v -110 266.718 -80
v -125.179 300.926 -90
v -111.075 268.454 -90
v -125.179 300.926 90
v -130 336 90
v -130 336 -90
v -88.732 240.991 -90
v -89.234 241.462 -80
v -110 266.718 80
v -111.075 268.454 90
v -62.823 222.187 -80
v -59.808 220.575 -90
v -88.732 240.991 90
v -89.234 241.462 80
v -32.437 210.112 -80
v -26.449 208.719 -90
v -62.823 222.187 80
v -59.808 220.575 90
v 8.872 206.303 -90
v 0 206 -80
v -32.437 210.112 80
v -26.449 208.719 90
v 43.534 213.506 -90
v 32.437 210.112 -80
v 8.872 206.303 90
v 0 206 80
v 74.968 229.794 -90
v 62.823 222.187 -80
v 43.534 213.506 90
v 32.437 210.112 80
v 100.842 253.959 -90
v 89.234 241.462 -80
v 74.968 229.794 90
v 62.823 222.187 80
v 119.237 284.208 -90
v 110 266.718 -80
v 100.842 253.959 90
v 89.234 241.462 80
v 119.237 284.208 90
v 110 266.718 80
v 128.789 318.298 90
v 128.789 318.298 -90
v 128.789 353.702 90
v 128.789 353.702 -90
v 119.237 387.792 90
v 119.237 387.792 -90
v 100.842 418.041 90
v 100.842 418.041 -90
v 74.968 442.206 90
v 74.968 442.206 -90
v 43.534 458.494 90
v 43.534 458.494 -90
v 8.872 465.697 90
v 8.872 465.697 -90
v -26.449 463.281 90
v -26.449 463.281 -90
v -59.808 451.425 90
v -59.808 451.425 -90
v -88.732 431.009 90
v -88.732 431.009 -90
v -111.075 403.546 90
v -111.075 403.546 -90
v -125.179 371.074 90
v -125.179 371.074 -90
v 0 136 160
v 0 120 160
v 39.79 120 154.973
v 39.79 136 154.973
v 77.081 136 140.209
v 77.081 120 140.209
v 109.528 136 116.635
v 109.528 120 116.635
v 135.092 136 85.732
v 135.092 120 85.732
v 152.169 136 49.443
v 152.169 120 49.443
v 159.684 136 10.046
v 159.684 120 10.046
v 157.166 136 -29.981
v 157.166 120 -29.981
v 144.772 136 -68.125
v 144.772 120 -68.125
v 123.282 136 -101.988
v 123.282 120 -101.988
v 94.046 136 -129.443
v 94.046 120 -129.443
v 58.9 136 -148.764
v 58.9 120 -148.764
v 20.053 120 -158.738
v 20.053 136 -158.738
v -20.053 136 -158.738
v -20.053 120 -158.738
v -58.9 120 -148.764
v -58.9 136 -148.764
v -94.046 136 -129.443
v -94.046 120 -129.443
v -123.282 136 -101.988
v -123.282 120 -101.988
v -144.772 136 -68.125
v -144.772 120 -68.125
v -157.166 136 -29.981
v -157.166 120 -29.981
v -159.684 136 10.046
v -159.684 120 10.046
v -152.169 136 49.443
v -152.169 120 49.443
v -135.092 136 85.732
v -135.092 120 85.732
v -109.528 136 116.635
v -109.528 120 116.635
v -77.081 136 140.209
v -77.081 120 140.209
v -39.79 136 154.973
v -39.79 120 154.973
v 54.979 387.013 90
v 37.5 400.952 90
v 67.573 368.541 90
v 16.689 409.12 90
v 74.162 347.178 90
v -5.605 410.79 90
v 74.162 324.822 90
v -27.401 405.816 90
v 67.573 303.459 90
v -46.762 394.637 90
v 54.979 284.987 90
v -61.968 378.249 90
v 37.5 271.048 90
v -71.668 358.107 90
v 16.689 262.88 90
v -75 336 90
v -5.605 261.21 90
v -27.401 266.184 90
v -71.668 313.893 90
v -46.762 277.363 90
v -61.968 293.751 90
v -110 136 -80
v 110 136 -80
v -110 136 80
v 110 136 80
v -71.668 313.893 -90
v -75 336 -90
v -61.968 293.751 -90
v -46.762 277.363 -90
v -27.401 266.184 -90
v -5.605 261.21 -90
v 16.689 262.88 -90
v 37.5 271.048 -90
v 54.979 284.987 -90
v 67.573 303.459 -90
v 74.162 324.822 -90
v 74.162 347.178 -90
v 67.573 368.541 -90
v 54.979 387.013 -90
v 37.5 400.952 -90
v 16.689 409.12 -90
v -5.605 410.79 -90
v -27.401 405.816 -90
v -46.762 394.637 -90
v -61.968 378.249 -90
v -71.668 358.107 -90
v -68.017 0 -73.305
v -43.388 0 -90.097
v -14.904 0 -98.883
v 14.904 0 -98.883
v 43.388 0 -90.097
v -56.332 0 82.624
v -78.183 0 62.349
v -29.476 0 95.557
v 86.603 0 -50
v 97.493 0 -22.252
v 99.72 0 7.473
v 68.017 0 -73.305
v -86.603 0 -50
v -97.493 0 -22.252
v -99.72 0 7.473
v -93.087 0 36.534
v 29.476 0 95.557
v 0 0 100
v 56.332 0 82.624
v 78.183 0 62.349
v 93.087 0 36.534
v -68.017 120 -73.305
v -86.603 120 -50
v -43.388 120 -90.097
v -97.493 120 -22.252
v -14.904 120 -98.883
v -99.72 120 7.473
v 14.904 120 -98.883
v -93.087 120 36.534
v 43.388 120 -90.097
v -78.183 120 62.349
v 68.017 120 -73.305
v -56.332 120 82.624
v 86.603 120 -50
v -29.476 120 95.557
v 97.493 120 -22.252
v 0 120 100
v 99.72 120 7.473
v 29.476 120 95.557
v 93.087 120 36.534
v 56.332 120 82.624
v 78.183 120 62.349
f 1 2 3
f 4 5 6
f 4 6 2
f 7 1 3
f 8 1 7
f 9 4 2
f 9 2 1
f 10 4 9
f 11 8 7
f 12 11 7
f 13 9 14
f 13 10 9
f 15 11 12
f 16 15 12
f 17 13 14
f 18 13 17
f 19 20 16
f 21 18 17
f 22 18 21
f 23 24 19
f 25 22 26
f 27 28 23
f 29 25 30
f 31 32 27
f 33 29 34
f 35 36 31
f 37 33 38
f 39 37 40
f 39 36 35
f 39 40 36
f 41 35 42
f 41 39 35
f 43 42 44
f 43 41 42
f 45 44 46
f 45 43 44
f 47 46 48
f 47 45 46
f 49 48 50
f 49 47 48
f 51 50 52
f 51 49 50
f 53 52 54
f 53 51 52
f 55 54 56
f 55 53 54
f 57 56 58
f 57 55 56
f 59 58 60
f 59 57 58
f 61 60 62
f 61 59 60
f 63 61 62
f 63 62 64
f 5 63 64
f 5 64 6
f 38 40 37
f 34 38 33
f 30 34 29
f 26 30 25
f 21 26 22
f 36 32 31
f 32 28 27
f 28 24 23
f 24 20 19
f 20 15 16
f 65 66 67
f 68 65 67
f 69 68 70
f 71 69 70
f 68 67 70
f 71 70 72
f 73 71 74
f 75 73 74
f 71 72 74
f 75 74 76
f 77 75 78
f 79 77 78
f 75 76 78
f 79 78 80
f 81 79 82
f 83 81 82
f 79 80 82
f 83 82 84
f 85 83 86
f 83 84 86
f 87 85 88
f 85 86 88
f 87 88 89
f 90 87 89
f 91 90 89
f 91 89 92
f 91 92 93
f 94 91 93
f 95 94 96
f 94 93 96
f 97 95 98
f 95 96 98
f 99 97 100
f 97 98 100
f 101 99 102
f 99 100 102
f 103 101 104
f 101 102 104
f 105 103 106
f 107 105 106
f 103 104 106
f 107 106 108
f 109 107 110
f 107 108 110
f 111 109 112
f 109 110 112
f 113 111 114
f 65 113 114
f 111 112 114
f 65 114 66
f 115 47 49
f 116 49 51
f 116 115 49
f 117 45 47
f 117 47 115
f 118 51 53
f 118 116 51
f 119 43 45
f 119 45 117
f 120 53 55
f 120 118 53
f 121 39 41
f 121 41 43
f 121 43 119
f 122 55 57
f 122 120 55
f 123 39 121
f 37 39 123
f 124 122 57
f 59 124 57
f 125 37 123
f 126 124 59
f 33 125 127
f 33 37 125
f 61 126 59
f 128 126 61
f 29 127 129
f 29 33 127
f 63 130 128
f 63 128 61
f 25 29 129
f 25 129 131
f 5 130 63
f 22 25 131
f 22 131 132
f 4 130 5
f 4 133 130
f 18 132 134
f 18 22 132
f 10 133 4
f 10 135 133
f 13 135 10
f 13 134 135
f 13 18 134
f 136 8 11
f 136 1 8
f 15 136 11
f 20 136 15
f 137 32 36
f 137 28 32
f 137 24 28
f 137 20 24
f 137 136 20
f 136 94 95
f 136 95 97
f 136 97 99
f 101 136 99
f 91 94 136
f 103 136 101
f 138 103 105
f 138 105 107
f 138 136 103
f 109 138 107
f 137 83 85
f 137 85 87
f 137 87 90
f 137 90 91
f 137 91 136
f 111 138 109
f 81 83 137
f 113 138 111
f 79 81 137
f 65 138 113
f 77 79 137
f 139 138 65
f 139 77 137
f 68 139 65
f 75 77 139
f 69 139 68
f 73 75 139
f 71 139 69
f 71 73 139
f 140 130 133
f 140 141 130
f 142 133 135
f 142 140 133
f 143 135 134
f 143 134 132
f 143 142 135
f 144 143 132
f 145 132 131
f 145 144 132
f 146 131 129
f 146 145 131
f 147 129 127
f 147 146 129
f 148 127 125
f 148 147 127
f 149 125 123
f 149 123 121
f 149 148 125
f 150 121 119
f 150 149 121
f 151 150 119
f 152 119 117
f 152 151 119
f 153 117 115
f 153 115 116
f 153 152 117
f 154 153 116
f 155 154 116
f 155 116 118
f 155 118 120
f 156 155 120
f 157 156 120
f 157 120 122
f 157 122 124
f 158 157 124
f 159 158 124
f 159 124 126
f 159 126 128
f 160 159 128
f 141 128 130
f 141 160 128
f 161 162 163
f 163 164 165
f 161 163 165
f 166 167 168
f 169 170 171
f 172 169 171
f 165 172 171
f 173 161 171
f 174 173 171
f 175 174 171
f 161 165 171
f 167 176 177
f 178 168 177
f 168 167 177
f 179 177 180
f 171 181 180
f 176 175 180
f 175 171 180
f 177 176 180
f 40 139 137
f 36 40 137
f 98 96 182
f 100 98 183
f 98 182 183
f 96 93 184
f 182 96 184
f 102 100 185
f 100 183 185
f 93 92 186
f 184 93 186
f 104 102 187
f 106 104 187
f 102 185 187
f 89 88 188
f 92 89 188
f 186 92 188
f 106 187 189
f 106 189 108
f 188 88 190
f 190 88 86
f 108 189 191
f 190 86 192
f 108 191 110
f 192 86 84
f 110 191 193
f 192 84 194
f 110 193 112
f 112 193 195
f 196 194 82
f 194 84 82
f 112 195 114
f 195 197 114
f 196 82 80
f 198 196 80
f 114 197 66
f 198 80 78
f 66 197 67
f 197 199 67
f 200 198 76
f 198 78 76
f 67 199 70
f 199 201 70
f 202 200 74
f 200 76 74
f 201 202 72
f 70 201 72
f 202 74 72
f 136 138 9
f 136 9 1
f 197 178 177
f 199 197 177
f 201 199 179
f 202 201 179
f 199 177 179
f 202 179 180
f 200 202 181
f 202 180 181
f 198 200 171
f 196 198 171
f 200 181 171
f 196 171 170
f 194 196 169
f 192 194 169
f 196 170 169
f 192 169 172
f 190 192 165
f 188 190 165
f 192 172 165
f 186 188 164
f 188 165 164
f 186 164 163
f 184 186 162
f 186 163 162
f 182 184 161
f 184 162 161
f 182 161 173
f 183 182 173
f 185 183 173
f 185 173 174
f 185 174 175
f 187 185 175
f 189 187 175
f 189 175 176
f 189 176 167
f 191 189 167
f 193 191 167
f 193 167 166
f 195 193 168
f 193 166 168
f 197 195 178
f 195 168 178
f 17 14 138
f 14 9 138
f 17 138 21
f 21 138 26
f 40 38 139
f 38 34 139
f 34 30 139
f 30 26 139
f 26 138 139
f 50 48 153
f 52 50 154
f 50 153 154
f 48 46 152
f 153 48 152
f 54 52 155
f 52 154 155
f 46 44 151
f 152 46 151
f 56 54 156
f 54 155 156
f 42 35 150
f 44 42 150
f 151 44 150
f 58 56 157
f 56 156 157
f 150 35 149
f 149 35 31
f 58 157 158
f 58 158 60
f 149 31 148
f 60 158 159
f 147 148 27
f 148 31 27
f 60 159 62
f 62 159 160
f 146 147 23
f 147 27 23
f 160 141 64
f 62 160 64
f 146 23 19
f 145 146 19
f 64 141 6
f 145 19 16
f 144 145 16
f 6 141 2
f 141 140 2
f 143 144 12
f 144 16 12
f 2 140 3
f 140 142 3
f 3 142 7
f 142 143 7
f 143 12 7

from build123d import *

# Parameters (mm, degrees)
SKETCH1_R                = 100
BOSS_EXTRUDE1_DEPTH      = 120
SKETCH2_R                = 160
BOSS_EXTRUDE2_DEPTH      = 16
SKETCH3_R                = 130
SKETCH3_R_2              = 75
BOSS_EXTRUDE3_DEPTH      = 90
BOSS_EXTRUDE4_REACH      = 402.125
BOSS_EXTRUDE4_END_RADIUS = 130
SKETCH4_W                = 220
SKETCH4_H                = 160


with BuildPart() as part:
    # Sketch1 → Boss-Extrude1 (new body)
    with BuildSketch(Plane(origin=(0, 0, 0), x_dir=(1, 0, 0), z_dir=(0, 1, 0))):
        with Locations(Location((0, 0, 0), (0, 0, 270))):
            Circle(SKETCH1_R)
    extrude(amount=BOSS_EXTRUDE1_DEPTH)

    # Sketch2 → Boss-Extrude2 (add)
    with BuildSketch(Plane(origin=(0, 120, 0), x_dir=(1, 0, 0), z_dir=(0, 1, 0))):
        with Locations(Location((0, 0, 0), (0, 0, 270))):
            Circle(SKETCH2_R)
    extrude(amount=BOSS_EXTRUDE2_DEPTH)



with BuildPart() as body_2:
    # Sketch3 → Boss-Extrude3 (new, symmetric)
    with BuildSketch(Plane.XY):
        with Locations(Location((0, 336, 0), (0, 0, 180))):
            Circle(SKETCH3_R)
        with Locations(Location((0, 336, 0), (0, 0, 180))):
            Circle(SKETCH3_R_2, mode=Mode.SUBTRACT)
    extrude(amount=BOSS_EXTRUDE3_DEPTH, both=True)


with BuildPart() as part_1:
    add(part.part)

    add(body_2.part)  # Boss-Extrude4 merges body 2
    # Boss-Extrude4: up to this cylinder (the profile starts outside it)
    boss_extrude4_end = Plane(origin=(0, 336, 0), z_dir=(0, 0, -1)) * Cylinder(BOSS_EXTRUDE4_END_RADIUS, 1065.25, mode=Mode.PRIVATE)
    # Sketch4 → Boss-Extrude4 (add, up to the surface)
    with BuildSketch(Plane(origin=(0, 136, 0), x_dir=(1, 0, 0), z_dir=(0, 1, 0)), mode=Mode.PRIVATE) as boss_extrude4_sk1:
        Rectangle(SKETCH4_W, SKETCH4_H)
    boss_extrude4_tool1 = extrude(boss_extrude4_sk1.sketch, amount=BOSS_EXTRUDE4_REACH, mode=Mode.PRIVATE) - boss_extrude4_end
    add(boss_extrude4_tool1.solids().sort_by_distance((0, 136, 0))[0])


solid = part_1.part
